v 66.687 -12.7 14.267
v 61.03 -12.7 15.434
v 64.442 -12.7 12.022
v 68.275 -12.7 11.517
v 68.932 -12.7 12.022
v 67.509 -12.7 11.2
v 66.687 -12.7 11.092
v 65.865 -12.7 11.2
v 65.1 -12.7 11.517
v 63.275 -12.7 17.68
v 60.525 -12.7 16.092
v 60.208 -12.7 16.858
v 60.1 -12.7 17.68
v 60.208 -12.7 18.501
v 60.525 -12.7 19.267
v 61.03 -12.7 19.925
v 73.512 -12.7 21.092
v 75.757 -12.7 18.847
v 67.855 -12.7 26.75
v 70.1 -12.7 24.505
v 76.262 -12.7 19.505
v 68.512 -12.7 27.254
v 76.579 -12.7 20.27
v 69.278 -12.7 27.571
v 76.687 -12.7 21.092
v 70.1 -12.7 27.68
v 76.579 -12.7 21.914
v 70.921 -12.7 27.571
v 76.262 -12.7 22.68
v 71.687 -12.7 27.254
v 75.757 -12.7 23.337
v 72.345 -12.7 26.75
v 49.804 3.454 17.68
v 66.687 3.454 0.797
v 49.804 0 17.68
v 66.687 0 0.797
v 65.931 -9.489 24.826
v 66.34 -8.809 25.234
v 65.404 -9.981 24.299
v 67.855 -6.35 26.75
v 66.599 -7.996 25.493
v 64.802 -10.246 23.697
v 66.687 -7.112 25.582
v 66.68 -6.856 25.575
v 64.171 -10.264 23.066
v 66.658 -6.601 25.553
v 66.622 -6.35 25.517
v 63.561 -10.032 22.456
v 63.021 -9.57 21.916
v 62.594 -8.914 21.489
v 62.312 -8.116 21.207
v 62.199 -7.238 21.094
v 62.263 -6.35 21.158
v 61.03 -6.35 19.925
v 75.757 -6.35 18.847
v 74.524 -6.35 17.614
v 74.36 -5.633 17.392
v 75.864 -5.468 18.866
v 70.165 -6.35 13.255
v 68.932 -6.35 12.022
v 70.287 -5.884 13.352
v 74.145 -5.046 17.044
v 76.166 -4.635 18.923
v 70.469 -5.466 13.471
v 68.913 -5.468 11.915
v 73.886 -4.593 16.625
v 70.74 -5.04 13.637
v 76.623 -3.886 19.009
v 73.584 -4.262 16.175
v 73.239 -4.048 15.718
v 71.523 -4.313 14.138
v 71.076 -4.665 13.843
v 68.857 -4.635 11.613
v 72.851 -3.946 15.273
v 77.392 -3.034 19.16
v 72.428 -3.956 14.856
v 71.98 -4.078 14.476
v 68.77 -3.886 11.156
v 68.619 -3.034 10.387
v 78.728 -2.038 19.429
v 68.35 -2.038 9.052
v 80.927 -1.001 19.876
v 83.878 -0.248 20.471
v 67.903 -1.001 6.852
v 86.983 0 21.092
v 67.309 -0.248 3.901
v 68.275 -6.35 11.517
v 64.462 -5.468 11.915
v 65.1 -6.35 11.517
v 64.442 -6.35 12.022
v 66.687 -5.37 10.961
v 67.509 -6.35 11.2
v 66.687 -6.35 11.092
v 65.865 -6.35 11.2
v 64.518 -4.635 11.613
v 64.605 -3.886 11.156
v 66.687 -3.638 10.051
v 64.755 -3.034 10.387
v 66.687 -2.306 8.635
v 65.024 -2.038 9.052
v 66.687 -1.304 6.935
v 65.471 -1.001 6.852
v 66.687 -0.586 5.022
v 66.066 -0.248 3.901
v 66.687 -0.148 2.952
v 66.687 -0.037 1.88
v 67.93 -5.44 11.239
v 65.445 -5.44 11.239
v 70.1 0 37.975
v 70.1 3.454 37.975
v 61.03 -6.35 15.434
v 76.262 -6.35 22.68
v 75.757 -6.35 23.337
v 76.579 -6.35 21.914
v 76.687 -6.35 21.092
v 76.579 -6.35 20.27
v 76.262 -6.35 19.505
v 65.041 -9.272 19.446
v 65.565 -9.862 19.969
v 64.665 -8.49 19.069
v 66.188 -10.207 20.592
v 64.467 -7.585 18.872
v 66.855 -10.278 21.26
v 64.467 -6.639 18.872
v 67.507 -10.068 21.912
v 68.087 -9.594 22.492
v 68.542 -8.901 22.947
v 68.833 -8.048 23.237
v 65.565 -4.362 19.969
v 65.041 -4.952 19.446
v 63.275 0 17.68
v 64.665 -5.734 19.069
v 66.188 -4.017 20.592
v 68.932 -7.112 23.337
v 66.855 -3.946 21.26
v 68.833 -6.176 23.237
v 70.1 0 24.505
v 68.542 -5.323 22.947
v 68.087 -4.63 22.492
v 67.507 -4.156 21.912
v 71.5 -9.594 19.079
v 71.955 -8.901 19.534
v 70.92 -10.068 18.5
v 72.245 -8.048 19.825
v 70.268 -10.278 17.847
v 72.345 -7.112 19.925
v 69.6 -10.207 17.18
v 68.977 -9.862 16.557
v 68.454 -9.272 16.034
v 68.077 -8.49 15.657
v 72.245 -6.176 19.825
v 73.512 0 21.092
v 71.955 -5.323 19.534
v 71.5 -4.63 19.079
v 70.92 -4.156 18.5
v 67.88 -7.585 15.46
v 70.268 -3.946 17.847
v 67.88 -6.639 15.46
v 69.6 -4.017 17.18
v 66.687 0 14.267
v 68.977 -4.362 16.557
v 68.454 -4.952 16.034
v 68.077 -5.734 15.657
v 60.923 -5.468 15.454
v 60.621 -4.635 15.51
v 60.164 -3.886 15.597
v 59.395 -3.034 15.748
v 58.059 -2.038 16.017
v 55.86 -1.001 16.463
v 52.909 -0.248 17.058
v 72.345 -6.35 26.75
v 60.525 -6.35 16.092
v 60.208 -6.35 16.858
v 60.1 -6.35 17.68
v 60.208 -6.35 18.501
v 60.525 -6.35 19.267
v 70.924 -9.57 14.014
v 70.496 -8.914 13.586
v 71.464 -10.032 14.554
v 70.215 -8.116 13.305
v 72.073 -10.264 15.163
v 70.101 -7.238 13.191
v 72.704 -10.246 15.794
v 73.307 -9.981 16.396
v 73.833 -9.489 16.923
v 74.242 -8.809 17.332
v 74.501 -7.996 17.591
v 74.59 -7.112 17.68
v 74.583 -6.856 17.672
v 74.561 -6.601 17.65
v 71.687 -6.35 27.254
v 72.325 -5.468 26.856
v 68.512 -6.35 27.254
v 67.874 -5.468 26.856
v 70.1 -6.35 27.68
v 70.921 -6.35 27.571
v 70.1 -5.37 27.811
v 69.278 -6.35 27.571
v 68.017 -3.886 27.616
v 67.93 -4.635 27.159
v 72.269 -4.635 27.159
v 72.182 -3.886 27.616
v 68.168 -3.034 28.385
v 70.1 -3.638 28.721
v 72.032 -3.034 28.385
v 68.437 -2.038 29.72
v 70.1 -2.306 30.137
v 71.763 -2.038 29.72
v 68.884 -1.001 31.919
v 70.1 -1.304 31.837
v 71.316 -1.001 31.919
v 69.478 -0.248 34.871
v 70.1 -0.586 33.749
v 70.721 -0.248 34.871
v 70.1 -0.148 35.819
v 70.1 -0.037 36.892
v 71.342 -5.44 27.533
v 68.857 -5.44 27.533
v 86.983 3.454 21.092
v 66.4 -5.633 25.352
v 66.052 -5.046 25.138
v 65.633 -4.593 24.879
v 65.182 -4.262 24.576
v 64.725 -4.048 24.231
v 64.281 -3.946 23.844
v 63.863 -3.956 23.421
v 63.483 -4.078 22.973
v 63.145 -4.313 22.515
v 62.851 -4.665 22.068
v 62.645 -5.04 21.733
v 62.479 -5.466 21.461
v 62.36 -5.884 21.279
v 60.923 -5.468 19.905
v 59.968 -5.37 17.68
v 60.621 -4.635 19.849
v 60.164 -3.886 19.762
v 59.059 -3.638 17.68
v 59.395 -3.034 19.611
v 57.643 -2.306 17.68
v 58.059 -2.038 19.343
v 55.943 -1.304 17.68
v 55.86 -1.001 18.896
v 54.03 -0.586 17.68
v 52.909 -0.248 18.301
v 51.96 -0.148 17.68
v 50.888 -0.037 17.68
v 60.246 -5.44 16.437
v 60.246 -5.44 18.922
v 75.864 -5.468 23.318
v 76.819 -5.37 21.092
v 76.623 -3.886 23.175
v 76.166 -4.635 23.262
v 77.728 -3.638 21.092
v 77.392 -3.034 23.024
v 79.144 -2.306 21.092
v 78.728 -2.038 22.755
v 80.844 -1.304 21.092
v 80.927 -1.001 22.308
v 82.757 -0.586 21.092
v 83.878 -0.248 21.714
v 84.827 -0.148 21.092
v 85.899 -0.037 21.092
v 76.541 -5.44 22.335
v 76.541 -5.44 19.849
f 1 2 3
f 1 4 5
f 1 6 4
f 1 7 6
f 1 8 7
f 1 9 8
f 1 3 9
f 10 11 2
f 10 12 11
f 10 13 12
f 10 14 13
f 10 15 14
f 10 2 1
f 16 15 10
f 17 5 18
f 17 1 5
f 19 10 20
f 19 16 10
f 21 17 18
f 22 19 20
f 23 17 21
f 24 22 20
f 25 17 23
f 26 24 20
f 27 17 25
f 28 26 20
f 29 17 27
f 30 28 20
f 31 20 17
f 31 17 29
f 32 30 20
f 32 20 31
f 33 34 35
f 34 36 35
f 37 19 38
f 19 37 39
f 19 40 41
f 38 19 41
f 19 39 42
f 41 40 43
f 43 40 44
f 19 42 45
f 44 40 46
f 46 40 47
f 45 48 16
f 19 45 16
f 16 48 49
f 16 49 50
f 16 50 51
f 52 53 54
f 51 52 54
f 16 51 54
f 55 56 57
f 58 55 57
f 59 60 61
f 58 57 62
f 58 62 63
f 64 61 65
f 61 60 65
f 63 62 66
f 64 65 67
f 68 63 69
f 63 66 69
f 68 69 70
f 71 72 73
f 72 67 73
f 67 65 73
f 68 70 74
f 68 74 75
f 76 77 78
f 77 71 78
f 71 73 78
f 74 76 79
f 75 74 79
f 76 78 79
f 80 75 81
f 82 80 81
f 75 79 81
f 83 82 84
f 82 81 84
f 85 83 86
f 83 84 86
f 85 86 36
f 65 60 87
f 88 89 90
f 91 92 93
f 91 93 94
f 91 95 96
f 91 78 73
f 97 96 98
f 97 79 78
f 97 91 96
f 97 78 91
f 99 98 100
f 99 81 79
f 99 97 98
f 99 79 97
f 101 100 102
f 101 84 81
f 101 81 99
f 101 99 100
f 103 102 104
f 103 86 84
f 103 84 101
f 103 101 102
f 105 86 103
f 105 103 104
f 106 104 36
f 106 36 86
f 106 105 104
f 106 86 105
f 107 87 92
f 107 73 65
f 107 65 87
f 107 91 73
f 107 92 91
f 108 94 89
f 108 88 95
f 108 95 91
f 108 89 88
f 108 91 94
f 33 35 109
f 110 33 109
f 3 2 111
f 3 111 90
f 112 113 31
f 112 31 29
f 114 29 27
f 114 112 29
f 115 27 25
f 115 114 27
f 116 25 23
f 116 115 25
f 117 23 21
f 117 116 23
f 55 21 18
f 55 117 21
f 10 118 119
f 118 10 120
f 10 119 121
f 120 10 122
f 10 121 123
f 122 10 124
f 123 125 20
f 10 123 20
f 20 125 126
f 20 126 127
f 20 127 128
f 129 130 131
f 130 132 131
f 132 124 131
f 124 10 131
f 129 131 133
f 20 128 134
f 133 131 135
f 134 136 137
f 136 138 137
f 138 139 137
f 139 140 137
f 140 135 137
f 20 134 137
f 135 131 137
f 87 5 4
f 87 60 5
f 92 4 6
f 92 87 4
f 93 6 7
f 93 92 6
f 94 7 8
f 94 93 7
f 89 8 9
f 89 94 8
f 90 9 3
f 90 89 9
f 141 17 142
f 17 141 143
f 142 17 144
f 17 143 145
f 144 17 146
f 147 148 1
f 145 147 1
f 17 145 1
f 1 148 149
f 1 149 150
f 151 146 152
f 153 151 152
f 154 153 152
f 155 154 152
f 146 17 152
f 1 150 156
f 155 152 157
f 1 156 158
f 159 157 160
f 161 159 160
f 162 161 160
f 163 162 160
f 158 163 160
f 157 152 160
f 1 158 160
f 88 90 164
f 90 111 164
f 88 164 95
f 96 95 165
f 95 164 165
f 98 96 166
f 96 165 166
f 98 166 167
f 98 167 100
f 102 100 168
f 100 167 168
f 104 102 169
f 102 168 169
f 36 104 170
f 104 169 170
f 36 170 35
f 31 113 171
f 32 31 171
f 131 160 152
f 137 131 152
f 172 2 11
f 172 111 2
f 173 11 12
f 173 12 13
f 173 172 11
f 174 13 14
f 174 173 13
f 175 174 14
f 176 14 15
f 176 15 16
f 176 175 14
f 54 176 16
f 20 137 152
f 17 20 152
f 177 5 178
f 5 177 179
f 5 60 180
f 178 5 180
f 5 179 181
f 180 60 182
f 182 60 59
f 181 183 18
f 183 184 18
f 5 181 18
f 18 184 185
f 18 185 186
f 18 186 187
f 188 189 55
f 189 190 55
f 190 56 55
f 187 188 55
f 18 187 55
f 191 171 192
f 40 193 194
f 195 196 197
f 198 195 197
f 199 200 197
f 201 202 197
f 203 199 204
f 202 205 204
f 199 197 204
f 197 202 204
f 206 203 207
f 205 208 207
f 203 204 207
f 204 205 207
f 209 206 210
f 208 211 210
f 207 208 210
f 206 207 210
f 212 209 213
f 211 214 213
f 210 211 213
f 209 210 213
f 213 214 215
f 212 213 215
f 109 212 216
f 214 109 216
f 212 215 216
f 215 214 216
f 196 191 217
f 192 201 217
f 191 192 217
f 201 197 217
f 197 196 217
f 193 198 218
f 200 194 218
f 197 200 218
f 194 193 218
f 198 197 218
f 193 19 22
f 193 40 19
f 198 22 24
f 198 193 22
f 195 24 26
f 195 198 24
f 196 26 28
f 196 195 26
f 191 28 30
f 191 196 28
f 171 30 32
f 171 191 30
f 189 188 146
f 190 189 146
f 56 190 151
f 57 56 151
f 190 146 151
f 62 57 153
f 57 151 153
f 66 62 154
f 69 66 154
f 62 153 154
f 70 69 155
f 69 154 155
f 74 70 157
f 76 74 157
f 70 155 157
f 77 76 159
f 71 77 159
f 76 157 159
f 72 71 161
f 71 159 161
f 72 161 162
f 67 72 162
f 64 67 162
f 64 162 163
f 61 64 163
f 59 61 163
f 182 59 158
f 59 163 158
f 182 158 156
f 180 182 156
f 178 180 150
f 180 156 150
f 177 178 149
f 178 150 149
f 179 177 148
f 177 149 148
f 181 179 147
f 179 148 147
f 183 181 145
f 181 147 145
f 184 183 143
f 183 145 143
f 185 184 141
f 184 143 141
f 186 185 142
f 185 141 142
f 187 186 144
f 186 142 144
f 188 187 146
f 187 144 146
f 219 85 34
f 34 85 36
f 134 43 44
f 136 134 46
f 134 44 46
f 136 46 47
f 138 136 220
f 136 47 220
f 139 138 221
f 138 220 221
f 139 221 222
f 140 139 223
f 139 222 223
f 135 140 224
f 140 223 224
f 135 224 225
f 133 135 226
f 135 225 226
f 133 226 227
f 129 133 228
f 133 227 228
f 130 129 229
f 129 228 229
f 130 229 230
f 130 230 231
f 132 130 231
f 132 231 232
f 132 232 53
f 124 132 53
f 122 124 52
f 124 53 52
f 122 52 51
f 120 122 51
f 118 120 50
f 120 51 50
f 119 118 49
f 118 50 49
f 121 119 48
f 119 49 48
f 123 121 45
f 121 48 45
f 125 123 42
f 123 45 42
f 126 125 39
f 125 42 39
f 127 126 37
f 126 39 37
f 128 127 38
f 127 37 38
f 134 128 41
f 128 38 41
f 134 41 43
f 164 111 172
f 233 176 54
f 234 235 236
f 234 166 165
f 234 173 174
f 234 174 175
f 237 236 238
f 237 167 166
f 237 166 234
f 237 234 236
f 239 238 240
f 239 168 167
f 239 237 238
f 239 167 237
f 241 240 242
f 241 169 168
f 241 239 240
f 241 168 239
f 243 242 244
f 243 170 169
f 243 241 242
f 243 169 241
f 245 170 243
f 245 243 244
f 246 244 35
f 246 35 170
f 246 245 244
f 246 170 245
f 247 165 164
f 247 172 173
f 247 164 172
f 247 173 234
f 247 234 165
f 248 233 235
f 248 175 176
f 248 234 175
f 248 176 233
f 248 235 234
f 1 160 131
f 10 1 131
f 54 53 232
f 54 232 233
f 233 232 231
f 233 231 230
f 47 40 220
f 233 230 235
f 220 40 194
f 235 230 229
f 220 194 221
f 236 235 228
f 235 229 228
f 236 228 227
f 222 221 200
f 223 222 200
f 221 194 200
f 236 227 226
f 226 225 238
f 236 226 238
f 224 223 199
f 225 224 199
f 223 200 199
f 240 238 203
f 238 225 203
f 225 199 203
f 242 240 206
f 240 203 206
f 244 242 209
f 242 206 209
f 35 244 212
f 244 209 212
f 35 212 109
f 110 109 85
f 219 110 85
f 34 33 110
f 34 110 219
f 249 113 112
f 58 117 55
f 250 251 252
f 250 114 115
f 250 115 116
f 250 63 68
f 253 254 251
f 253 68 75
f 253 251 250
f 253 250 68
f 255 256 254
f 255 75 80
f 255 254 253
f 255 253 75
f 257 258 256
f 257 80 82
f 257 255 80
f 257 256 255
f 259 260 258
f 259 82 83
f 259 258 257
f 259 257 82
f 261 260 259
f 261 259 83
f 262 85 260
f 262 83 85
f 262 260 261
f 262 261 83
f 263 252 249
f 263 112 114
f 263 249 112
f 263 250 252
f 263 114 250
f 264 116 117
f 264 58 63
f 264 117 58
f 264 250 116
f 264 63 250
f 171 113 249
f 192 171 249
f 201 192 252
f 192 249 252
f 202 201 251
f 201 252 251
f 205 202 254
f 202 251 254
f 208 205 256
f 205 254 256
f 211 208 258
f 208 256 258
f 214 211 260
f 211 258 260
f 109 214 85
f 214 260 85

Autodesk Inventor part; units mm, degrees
ref_plane "YZ Plane" through (0, 0, 0) normal (1, 0, 0) x (0, 1, 0)
ref_plane "XZ Plane" through (0, 0, 0) normal (0, 1, 0) x (-1, 0, 0)
ref_plane "XY Plane" through (0, 0, 0) normal (0, 0, 1) x (1, 0, 0)
sketch "Sketch1" plane through (0, 0, 0) normal (1, 0, 0) x (0, 1, 0)
  line L0 (0, 0) -> (41.5544, 0)
  line L1 (41.5544, 0) -> (41.5544, 37.0078)
  line L2 (41.5544, 37.0078) -> (0, 37.0078)
  line L3 (0, 37.0078) -> (0, 0)
  circle A0 centre (20.7772, 18.5039) radius 12.8778
  dimension "d0" = 41.5544
  dimension "d1" = 37.0078
  dimension "d2" = 25.7556
sketch "Sketch1 outline for Extrusion1" plane through (0, 0, 0) normal (1, 0, 0) x (0, 1, 0)
  line L0 (0, 0) -> (41.5544, 0)
  line L1 (0, 37.0078) -> (0, 0)
  line L2 (41.5544, 0) -> (41.5544, 37.0078)
  line L3 (41.5544, 37.0078) -> (0, 37.0078)
  circle A0 centre (20.7772, 18.5039) radius 12.8778
extrude "Extrusion1" add sketch "Sketch1 outline for Extrusion1" along normal blind 50.8
sketch "Sketch2" plane through (0, 0, 0) normal (0, 0, -1) x (-1, 0, 0)
  line L0 (-50.8, 0) -> (-50.8, 41.5544) projected
  line L1 (-50.8, 41.5544) -> (-87.8078, 41.5544)
  line L2 (-87.8078, 41.5544) -> (-87.8078, 0)
  line L3 (-87.8078, 0) -> (-50.8, 0)
  line L4 (-50.8, 0) -> (-50.8, 41.5544)
  circle A0 centre (-69.3039, 20.7772) radius 12.8778
  dimension "d5" = 37.0078
  dimension "d6" = 25.7556
sketch "Sketch2 outline for Extrusion2" plane through (0, 0, 0) normal (0, 0, -1) x (-1, 0, 0)
  line L0 (-50.8, 41.5544) -> (-87.8078, 41.5544)
  line L1 (-50.8, 0) -> (-50.8, 41.5544)
  line L2 (-87.8078, 0) -> (-50.8, 0)
  line L3 (-87.8078, 41.5544) -> (-87.8078, 0)
extrude "Extrusion2" add sketch "Sketch2 outline for Extrusion2" against normal up to surface (37.0078 mm away)
sketch "Sketch3" plane through (0, 0, 0) normal (0, 0, -1) x (-1, 0, 0)
  line L0 (0, 41.5544) -> (-87.8078, 41.5544) projected
  line L1 (-87.8078, 41.5544) -> (-87.8078, 0) projected
  line L2 (0, 0) -> (-87.8078, 0) projected
  line L3 (0, 0) -> (-87.8078, 0) projected
  line L4 (-87.8078, 41.5544) -> (-50.8, 41.5544)
  line L5 (-50.8, 41.5544) -> (-50.8, 0)
  line L6 (-50.8, 0) -> (-87.8078, 0)
  line L7 (-87.8078, 0) -> (-87.8078, 41.5544)
  circle A0 centre (-69.3039, 20.7772) radius 12.8778
  point P0 (-50.8, 0)
  dimension "d9" = 37.0078
  dimension "d10" = 25.7556
sketch "Sketch3 outline for Extrusion3" plane through (0, 0, 0) normal (0, 0, -1) x (-1, 0, 0)
  line L0 (-50.8, 0) -> (-50.8, 41.5544)
  line L1 (-87.8078, 0) -> (-50.8, 0)
  line L2 (-50.8, 41.5544) -> (-87.8078, 41.5544)
  line L3 (-87.8078, 41.5544) -> (-87.8078, 0)
  circle A0 centre (-69.3039, 20.7772) radius 12.8778
extrude "Extrusion3" add sketch "Sketch3 outline for Extrusion3" along normal blind 50.8
sketch "Sketch4" plane through (0, 41.5544, 37.0078) normal (0, 1, 0) x (1, 0, 0)
  line L0 (0, 0) -> (87.8078, 0)
  line L1 (87.8078, 87.8078) -> (87.8078, 0)
  line L2 (50.8, 37.0078) -> (50.8, 87.8078)
  line L3 (87.8078, 0) -> (87.8078, 87.8078)
  line L4 (50.8, 37.0078) -> (87.8078, 0)
  line L5 (87.8078, 0) -> (123.159418, -36.481545)
  line L6 (87.8078, 0) -> (100.892033, 13.084233)
  line L7 (0, 0) -> (87.8078, 0)
  line L8 (87.8078, 0) -> (74.723567, -13.084233)
  line L9 (100.892033, 13.084233) -> (87.8078, 26.168466)
  line L10 (74.723567, -13.084233) -> (61.639334, 0)
  line L11 (100.892033, 13.084233) -> (136.808615, -22.832348)
  line L12 (136.808615, -22.832348) -> (123.159418, -36.481545)
  line L13 (123.159418, -36.481545) -> (110.640148, -49.000815)
  line L14 (123.159418, -36.481545) -> (140.864338, -36.481545) construction
  line L15 (110.640148, -49.000815) -> (74.723567, -13.084233)
  dimension "d13" = 50.8
  dimension "d14" = 18.5039
  dimension "d15" = 18.5039
  dimension "d16" = 135
sketch "Sketch4 outline for Extrusion4" plane through (0, 41.5544, 37.0078) normal (0, 1, 0) x (1, 0, 0)
  line L0 (87.8078, 0) -> (61.639334, 0)
  line L1 (87.8078, 26.168466) -> (87.8078, 0)
  line L2 (100.892033, 13.084233) -> (87.8078, 26.168466)
  line L3 (136.808615, -22.832348) -> (100.892033, 13.084233)
  line L4 (123.159418, -36.481545) -> (136.808615, -22.832348)
  line L5 (110.640148, -49.000815) -> (123.159418, -36.481545)
  line L6 (74.723567, -13.084233) -> (110.640148, -49.000815)
  line L7 (61.639334, 0) -> (74.723567, -13.084233)
extrude "Extrusion4" add sketch "Sketch4 outline for Extrusion4" against normal up to surface (41.5544 mm away)
sketch "Sketch5" plane through (136.808615, 0, 59.840148) normal (0.7071068, 0, 0.7071068) x (0.7071068, 0, -0.7071068)
  line L0 (-18.5039, 41.5544) -> (-18.5039, 0) projected
  circle A0 centre (-18.5039, 20.7772) radius 12.8778
  point P0 (-54.424924, 0)
  dimension "d19" = 25.7556
sketch "Sketch5 outline for Extrusion5" plane through (136.808615, 0, 59.840148) normal (0.7071068, 0, 0.7071068) x (0.7071068, 0, -0.7071068)
  circle A0 centre (-18.5039, 20.7772) radius 12.8778
extrude "Extrusion5" cut sketch "Sketch5 outline for Extrusion5" against normal blind 76.2
sketch "Sketch6" plane through (0, 41.5544, 37.0078) normal (0, 1, 0) x (1, 0, 0)
  line L0 (0, 37.0078) -> (0, 0)
  line L1 (0, 0) -> (61.639334, 0)
  line L2 (61.639334, 0) -> (110.640148, -49.000815)
  line L3 (110.640148, -49.000815) -> (136.808615, -22.832348)
  line L4 (136.808615, -22.832348) -> (87.8078, 26.168466)
  line L5 (87.8078, 87.8078) -> (87.8078, 26.168466)
  line L6 (50.8, 87.8078) -> (87.8078, 87.8078)
  line L7 (50.8, 37.0078) -> (50.8, 87.8078)
  line L8 (0, 37.0078) -> (50.8, 37.0078)
  line L9 (0, 18.5039) -> (69.3039, 18.5039)
  line L10 (69.3039, 18.5039) -> (69.3039, 87.8078)
  line L11 (56.4261, 87.8078) -> (82.1817, 87.8078)
  line L12 (69.3039, 18.5039) -> (123.724381, -35.916581)
  circle A0 centre (2.4892, 2.879001) radius 1.5875
  circle A1 centre (2.4892, 34.128799) radius 1.5875
  circle A2 centre (84.928799, 85.3186) radius 1.5875
  circle A3 centre (53.679001, 85.3186) radius 1.5875
  circle A4 centre (110.915779, -45.204923) radius 1.5875
  circle A5 centre (133.012723, -23.107979) radius 1.5875
  dimension "d22" = 3.175
  dimension "d23" = 3.175
  dimension "d24" = 2.4892
  dimension "d25" = 2.4892
  dimension "d26" = 2.879
  dimension "d27" = 2.879
  dimension "d28" = 3.175
  dimension "d29" = 3.175
  dimension "d30" = 2.4892
  dimension "d31" = 2.4892
  dimension "d32" = 2.879
  dimension "d33" = 2.879
  dimension "d34" = 3.175
  dimension "d35" = 3.175
  dimension "d36" = 2.4892
  dimension "d37" = 2.4892
  dimension "d38" = 2.879
  dimension "d39" = 2.879
sketch "Sketch6 outline for Extrusion6" plane through (0, 41.5544, 37.0078) normal (0, 1, 0) x (1, 0, 0)
  circle A0 centre (110.915779, -45.204923) radius 1.5875
  circle A1 centre (133.012723, -23.107979) radius 1.5875
  circle A2 centre (2.4892, 34.128799) radius 1.5875
  circle A3 centre (2.4892, 2.879001) radius 1.5875
  circle A4 centre (53.679001, 85.3186) radius 1.5875
  circle A5 centre (84.928799, 85.3186) radius 1.5875
extrude "Extrusion6" cut sketch "Sketch6 outline for Extrusion6" against normal blind 50.8
sketch "Sketch7" plane through (0, 41.5544, 37.0078) normal (0, 1, 0) x (1, 0, 0)
  circle A0 centre (2.4892, 2.879001) radius 1.5875
  circle A1 centre (110.915779, -45.204923) radius 1.5875
  circle A2 centre (53.679001, 85.3186) radius 1.5875
  circle A3 centre (2.4892, 34.128799) radius 1.5875
  circle A4 centre (84.928799, 85.3186) radius 1.5875
  line L0 (0, 37.0078) -> (0, 0)
  line L1 (0, 0) -> (61.639334, 0)
  line L2 (61.639334, 0) -> (110.640148, -49.000815)
  line L3 (110.640148, -49.000815) -> (136.808615, -22.832348)
  line L4 (136.808615, -22.832348) -> (87.8078, 26.168466)
  line L5 (87.8078, 87.8078) -> (87.8078, 26.168466)
  line L6 (50.8, 87.8078) -> (87.8078, 87.8078)
  line L7 (50.8, 37.0078) -> (50.8, 87.8078)
  line L8 (0, 37.0078) -> (50.8, 37.0078)
  circle A5 centre (133.012723, -23.107979) radius 1.5875
  circle A6 centre (133.012723, -23.107979) radius 6
  circle A7 centre (110.915779, -45.204923) radius 6
  circle A8 centre (2.4892, 2.879001) radius 6
  circle A9 centre (2.4892, 34.128799) radius 6
  circle A10 centre (53.679001, 85.3186) radius 6
  circle A11 centre (84.928799, 85.3186) radius 6
  point P0 (0, 8.338294)
  point P1 (7.753357, 0)
  point P2 (7.753357, 37.0078)
  point P3 (0, 28.669506)
  point P4 (59.138294, 87.8078)
  point P5 (50.8, 80.054443)
  point P6 (79.469506, 87.8078)
  point P7 (87.8078, 80.054443)
  point P8 (130.91255, -28.728413)
  point P9 (131.326163, -17.349897)
  point P10 (105.157697, -43.518363)
  point P11 (116.536213, -43.10475)
  dimension "d42" = 12
  dimension "d43" = 12
  dimension "d44" = 12
  dimension "d45" = 12
  dimension "d46" = 12
  dimension "d47" = 12
sketch "Sketch7 outline for Extrusion7" plane through (0, 41.5544, 37.0078) normal (0, 1, 0) x (1, 0, 0)
  arc A0 (0, 8.338294) -> (7.753357, 0) centre (2.4892, 2.879001) ccw
  line L0 (0, 0) -> (0, 8.338294)
  line L1 (7.753357, 0) -> (0, 0)
  arc A1 (7.753357, 37.0078) -> (0, 28.669506) centre (2.4892, 34.128799) ccw
  line L2 (0, 37.0078) -> (7.753357, 37.0078)
  line L3 (0, 28.669506) -> (0, 37.0078)
  arc A2 (59.138294, 87.8078) -> (50.8, 80.054443) centre (53.679001, 85.3186) ccw
  line L4 (50.8, 87.8078) -> (59.138294, 87.8078)
  line L5 (50.8, 80.054443) -> (50.8, 87.8078)
  arc A3 (87.8078, 80.054443) -> (79.469506, 87.8078) centre (84.928799, 85.3186) ccw
  line L6 (87.8078, 87.8078) -> (87.8078, 80.054443)
  line L7 (79.469506, 87.8078) -> (87.8078, 87.8078)
  arc A4 (130.91255, -28.728413) -> (131.326163, -17.349897) centre (133.012723, -23.107979) ccw
  line L8 (136.808615, -22.832348) -> (130.91255, -28.728413)
  line L9 (131.326163, -17.349897) -> (136.808615, -22.832348)
  arc A5 (105.157697, -43.518363) -> (116.536213, -43.10475) centre (110.915779, -45.204923) ccw
  line L10 (110.640148, -49.000815) -> (105.157697, -43.518363)
  line L11 (116.536213, -43.10475) -> (110.640148, -49.000815)
extrude "Extrusion7" add sketch "Sketch7 outline for Extrusion7" against normal blind 4.7752
sketch "Sketch8" plane through (0, 0, 0) normal (0, -1, 0) x (1, 0, 0)
  circle A0 centre (2.4892, 34.128799) radius 1.5875
  circle A1 centre (53.679001, -48.3108) radius 1.5875
  circle A2 centre (2.4892, 2.879001) radius 1.5875
  circle A3 centre (84.928799, -48.3108) radius 1.5875
  line L0 (0, 37.0078) -> (0, 0)
  line L1 (0, 0) -> (50.8, 0)
  line L2 (50.8, 0) -> (50.8, -50.8)
  line L3 (87.8078, -50.8) -> (50.8, -50.8)
  line L4 (87.8078, 10.839334) -> (87.8078, -50.8)
  line L5 (136.808615, 59.840148) -> (87.8078, 10.839334)
  line L6 (110.640148, 86.008615) -> (136.808615, 59.840148)
  line L7 (61.639334, 37.0078) -> (110.640148, 86.008615)
  line L8 (0, 37.0078) -> (61.639334, 37.0078)
  circle A4 centre (110.915779, 82.212723) radius 1.5875
  circle A5 centre (110.915779, 82.212723) radius 6
  circle A6 centre (133.012723, 60.115779) radius 1.5875
  circle A7 centre (133.012723, 60.115779) radius 6
  circle A8 centre (84.928799, -48.3108) radius 6
  circle A9 centre (53.679001, -48.3108) radius 6
  circle A10 centre (2.4892, 2.879001) radius 6
  circle A11 centre (2.4892, 34.128799) radius 6
  point P0 (0, 8.338294)
  point P1 (7.753357, 0)
  point P2 (7.753357, 37.0078)
  point P3 (0, 28.669506)
  point P4 (116.536213, 80.11255)
  point P5 (105.157697, 80.526163)
  point P6 (131.326163, 54.357697)
  point P7 (130.91255, 65.736213)
  point P8 (87.8078, -43.046643)
  point P9 (79.469506, -50.8)
  point P10 (50.8, -43.046643)
  point P11 (59.138294, -50.8)
  dimension "d50" = 12
sketch "Sketch8 outline for Extrusion8" plane through (0, 0, 0) normal (0, -1, 0) x (1, 0, 0)
  arc A0 (0, 8.338294) -> (7.753357, 0) centre (2.4892, 2.879001) ccw
  line L0 (0, 0) -> (0, 8.338294)
  line L1 (7.753357, 0) -> (0, 0)
  arc A1 (7.753357, 37.0078) -> (0, 28.669506) centre (2.4892, 34.128799) ccw
  line L2 (0, 37.0078) -> (7.753357, 37.0078)
  line L3 (0, 28.669506) -> (0, 37.0078)
  arc A2 (116.536213, 80.11255) -> (105.157697, 80.526163) centre (110.915779, 82.212723) ccw
  line L4 (110.640148, 86.008615) -> (116.536213, 80.11255)
  line L5 (105.157697, 80.526163) -> (110.640148, 86.008615)
  arc A3 (131.326163, 54.357697) -> (130.91255, 65.736213) centre (133.012723, 60.115779) ccw
  line L6 (136.808615, 59.840148) -> (131.326163, 54.357697)
  line L7 (130.91255, 65.736213) -> (136.808615, 59.840148)
  arc A4 (79.469506, -50.8) -> (87.8078, -43.046643) centre (84.928799, -48.3108) ccw
  line L8 (87.8078, -50.8) -> (79.469506, -50.8)
  line L9 (87.8078, -43.046643) -> (87.8078, -50.8)
  arc A5 (50.8, -43.046643) -> (59.138294, -50.8) centre (53.679001, -48.3108) ccw
  line L10 (50.8, -50.8) -> (50.8, -43.046643)
  line L11 (59.138294, -50.8) -> (50.8, -50.8)
extrude "Extrusion8" add sketch "Sketch8 outline for Extrusion8" against normal blind 4.7752
sketch "Sketch9" plane through (0, 41.5544, 28.669506) normal (0, 1, 0) x (1, 0, 0)
  circle A0 centre (2.4892, -5.459293) radius 1.5875
  circle A1 centre (110.915779, -53.543218) radius 1.5875
  circle A2 centre (53.679001, 76.980306) radius 1.5875
  circle A3 centre (2.4892, 25.790504) radius 1.5875
  circle A4 centre (133.012723, -31.446274) radius 1.5875
  circle A5 centre (84.928799, 76.980306) radius 1.5875
  arc A6 (0, 0) -> (7.753357, -8.338294) centre (2.4892, -5.459293) ccw
  arc A7 (105.157697, -51.856657) -> (116.536213, -51.443044) centre (110.915779, -53.543218) ccw
  arc A8 (87.8078, 71.716148) -> (79.469506, 79.469506) centre (84.928799, 76.980306) ccw
  arc A9 (7.753357, 28.669506) -> (0, 20.331211) centre (2.4892, 25.790504) ccw
  circle A10 centre (110.915779, -53.543218) radius 2.925
  circle A11 centre (133.012723, -31.446274) radius 1.5875
  circle A12 centre (133.012723, -31.446274) radius 2.925
  circle A13 centre (84.928799, 76.980306) radius 2.925
  circle A14 centre (53.679001, 76.980306) radius 1.5875
  circle A15 centre (53.679001, 76.980306) radius 2.925
  circle A16 centre (2.4892, 25.790504) radius 2.925
  circle A17 centre (2.4892, -5.459293) radius 2.925
  point P0 (0, 28.669506)
  dimension "d53" = 5.85
  dimension "d54" = 5.85
  dimension "d55" = 5.85
  dimension "d56" = 5.85
  dimension "d57" = 5.85
  dimension "d58" = 5.85
sketch "Sketch10" plane through (0, 0, -50.8) normal (0, 0, -1) x (-1, 0, 0)
  line L0 (-59.138294, 4.7752) -> (-50.8, 4.7752)
  line L1 (-50.8, 4.7752) -> (-50.8, 36.7792)
  line L2 (-50.8, 36.7792) -> (-59.138294, 36.7792)
  line L3 (-79.469506, 36.7792) -> (-87.8078, 36.7792)
  line L4 (-87.8078, 36.7792) -> (-87.8078, 4.7752)
  line L5 (-87.8078, 4.7752) -> (-79.469506, 4.7752)
  circle A0 centre (-69.3039, 20.7772) radius 12.8778
  line L6 (-87.8078, 4.7752) -> (-50.8, 4.7752)
  line L7 (-50.8, 4.7752) -> (-50.8, 36.7792)
  line L8 (-50.8, 36.7792) -> (-87.8078, 36.7792)
  line L9 (-87.8078, 36.7792) -> (-87.8078, 4.7752)
  line L10 (-87.8078, 4.7752) -> (-50.8, 36.7792) construction
  line L11 (-50.8, 4.7752) -> (-87.8078, 36.7792) construction
  point P0 (0, 0)
sketch "Sketch10 outline for Extrusion9" plane through (0, 0, -50.8) normal (0, 0, -1) x (-1, 0, 0)
  line L0 (-59.138294, 36.7792) -> (-79.469506, 36.7792)
  line L1 (-50.8, 36.7792) -> (-59.138294, 36.7792)
  line L2 (-79.469506, 36.7792) -> (-87.8078, 36.7792)
  line L3 (-50.8, 4.7752) -> (-50.8, 36.7792)
  line L4 (-87.8078, 36.7792) -> (-87.8078, 4.7752)
  line L5 (-59.138294, 4.7752) -> (-50.8, 4.7752)
  line L6 (-87.8078, 4.7752) -> (-79.469506, 4.7752)
  line L7 (-79.469506, 4.7752) -> (-59.138294, 4.7752)
  circle A0 centre (-69.3039, 20.7772) radius 12.8778
extrude "Extrusion9" cut sketch "Sketch10 outline for Extrusion9" against normal blind 5.0038
sketch "Sketch11" plane through (0, 0, 0) normal (-1, 0, 0) x (0, 0, 1)
  line L0 (28.669506, 4.7752) -> (37.0078, 4.7752)
  line L1 (37.0078, 36.7792) -> (37.0078, 4.7752)
  line L2 (37.0078, 36.7792) -> (28.669506, 36.7792)
  line L3 (8.338294, 36.7792) -> (0, 36.7792)
  line L4 (0, 4.7752) -> (0, 36.7792)
  line L5 (0, 4.7752) -> (8.338294, 4.7752)
  circle A0 centre (18.5039, 20.7772) radius 12.8778
  line L6 (0, 4.7752) -> (37.0078, 4.7752)
  line L7 (37.0078, 4.7752) -> (37.0078, 36.7792)
  line L8 (37.0078, 36.7792) -> (0, 36.7792)
  line L9 (0, 36.7792) -> (0, 4.7752)
  line L10 (0, 4.7752) -> (37.0078, 36.7792) construction
  line L11 (37.0078, 4.7752) -> (0, 36.7792) construction
  point P0 (0, 0)
sketch "Sketch11 outline for Extrusion10" plane through (0, 0, 0) normal (-1, 0, 0) x (0, 0, 1)
  line L0 (28.669506, 36.7792) -> (8.338294, 36.7792)
  line L1 (37.0078, 36.7792) -> (28.669506, 36.7792)
  line L2 (8.338294, 36.7792) -> (0, 36.7792)
  line L3 (37.0078, 4.7752) -> (37.0078, 36.7792)
  line L4 (0, 36.7792) -> (0, 4.7752)
  line L5 (28.669506, 4.7752) -> (37.0078, 4.7752)
  line L6 (0, 4.7752) -> (8.338294, 4.7752)
  line L7 (8.338294, 4.7752) -> (28.669506, 4.7752)
  circle A0 centre (18.5039, 20.7772) radius 12.8778
extrude "Extrusion10" cut sketch "Sketch11 outline for Extrusion10" against normal blind 5.0038
sketch "Sketch12" plane through (130.91255, 36.7792, 65.736213) normal (0.7071068, 0, 0.7071068) x (0.7071068, 0, -0.7071068)
  line L0 (0, -32.004) -> (8.338294, -32.004)
  line L1 (8.338294, 0) -> (8.338294, -32.004)
  line L2 (8.338294, 0) -> (0, 0)
  line L3 (-20.331211, 0) -> (-28.669506, 0)
  line L4 (-28.669506, 0) -> (-28.669506, -32.004)
  line L5 (-28.669506, -32.004) -> (-20.331211, -32.004)
  circle A0 centre (-10.165606, -16.002) radius 12.8778
  line L6 (-28.669506, -32.004) -> (8.338294, -32.004)
  line L7 (8.338294, -32.004) -> (8.338294, 0)
  line L8 (8.338294, 0) -> (-28.669506, 0)
  line L9 (-28.669506, 0) -> (-28.669506, -32.004)
  line L10 (-28.669506, -32.004) -> (8.338294, 0) construction
  line L11 (8.338294, -32.004) -> (-28.669506, 0) construction
  point P0 (-46.08663, -36.7792)
  point P1 (-20.331211, 0)
  point P2 (-20.331211, -32.004)
sketch "Sketch12 outline for Extrusion11" plane through (130.91255, 36.7792, 65.736213) normal (0.7071068, 0, 0.7071068) x (0.7071068, 0, -0.7071068)
  line L0 (0, 0) -> (-20.331211, 0)
  line L1 (8.338294, 0) -> (0, 0)
  line L2 (-20.331211, 0) -> (-28.669506, 0)
  line L3 (8.338294, -32.004) -> (8.338294, 0)
  line L4 (-28.669506, 0) -> (-28.669506, -32.004)
  line L5 (0, -32.004) -> (8.338294, -32.004)
  line L6 (-28.669506, -32.004) -> (-20.331211, -32.004)
  line L7 (-20.331211, -32.004) -> (0, -32.004)
  circle A0 centre (-10.165606, -16.002) radius 12.8778
extrude "Extrusion11" cut sketch "Sketch12 outline for Extrusion11" against normal blind 5.0038
sketch "Sketch9 outline for Extrusion12" plane through (0, 41.5544, 28.669506) normal (0, 1, 0) x (1, 0, 0)
  circle A0 centre (53.679001, 76.980306) radius 2.925
  circle A1 centre (53.679001, 76.980306) radius 1.5875
  circle A2 centre (84.928799, 76.980306) radius 2.925
  circle A3 centre (84.928799, 76.980306) radius 1.5875
  circle A4 centre (133.012723, -31.446274) radius 2.925
  circle A5 centre (133.012723, -31.446274) radius 1.5875
  circle A6 centre (110.915779, -53.543218) radius 2.925
  circle A7 centre (110.915779, -53.543218) radius 1.5875
  circle A8 centre (2.4892, -5.459293) radius 2.925
  circle A9 centre (2.4892, -5.459293) radius 1.5875
  circle A10 centre (2.4892, 25.790504) radius 2.925
  circle A11 centre (2.4892, 25.790504) radius 1.5875
extrude "Extrusion12" cut sketch "Sketch9 outline for Extrusion12" against normal blind 5.08
sketch "Sketch13" plane through (0, 41.5544, 28.669506) normal (0, 1, 0) x (1, 0, 0)
  line L0 (59.138294, 79.469506) -> (79.469506, 79.469506)
  line L1 (0, 20.331211) -> (0, 0)
  line L2 (116.536213, -51.443044) -> (130.91255, -37.066707)
  line L3 (78.948824, 18.732641) -> (60.736865, 0.520681)
  line L4 (79.469506, 79.469506) -> (59.138294, 79.469506)
  line L5 (69.3039, 79.469506) -> (69.3039, 9.087716)
  line L6 (69.3039, 9.087716) -> (123.185437, -44.79382)
  line L7 (130.91255, -37.066707) -> (116.536213, -51.443044)
  line L8 (0, 10.165606) -> (69.3039, 10.165606)
  circle A0 centre (15.875, 10.165606) radius 6.35
  circle A1 centre (69.3039, 63.594506) radius 6.35
  circle A2 centre (111.960117, -33.5685) radius 6.35
  circle A3 centre (41.275, 10.165606) radius 6.35
  circle A4 centre (69.3039, 38.194506) radius 6.35
  circle A5 centre (93.999604, -15.607988) radius 6.35
  circle A6 centre (76.039092, 2.352524) radius 6.35
  point P0 (0, 28.669506)
  dimension "d68" = 12.7
  dimension "d69" = 15.875
  dimension "d72" = 12.7
  dimension "d73" = 15.875
  dimension "d77" = 12.7
  dimension "d78" = 15.875
  dimension "d83" = 25.4
  dimension "d90" = 25.4
  dimension "d97" = 25.4
extrude "Extrusion13" [suppressed]
sketch "Sketch15" plane through (0, 0, 8.338294) normal (0, -1, 0) x (1, 0, 0)
  line L0 (0, 0) -> (0, 20.331211)
  line L1 (116.754985, -37.31401) -> (68.393487, 11.047489)
  line L2 (68.393487, 11.047489) -> (118.02233, 60.676332)
  line L3 (68.393487, 11.047489) -> (18.764644, 60.676332) construction
  line L4 (73.512233, 12.753737) -> (70.099736, 16.166235)
  line L5 (70.099736, 16.166235) -> (63.274741, 9.34124)
  line L6 (63.274741, 9.34124) -> (66.687238, 5.928743)
  line L7 (66.687238, 5.928743) -> (73.512233, 12.753737)
  line L8 (73.512233, 12.753737) -> (63.274741, 9.34124) construction
  line L9 (70.099736, 16.166235) -> (66.687238, 5.928743) construction
  line L10 (78.002361, 12.753737) -> (70.099736, 20.656363)
  line L11 (70.099736, 20.656363) -> (58.784613, 9.34124)
  line L12 (58.784613, 9.34124) -> (66.687238, 1.438615)
  line L13 (66.687238, 1.438615) -> (78.002361, 12.753737)
  line L14 (78.002361, 12.753737) -> (58.784613, 9.34124) construction
  line L15 (70.099736, 20.656363) -> (66.687238, 1.438615) construction
  point P0 (0, -8.338294)
  dimension "d104" = 90
  dimension "d105" = 4.826
  dimension "d106" = 9.652
  dimension "d107" = 11.176
  dimension "d108" = 16.002
sketch "Sketch15 outline for Extrusion14" plane through (0, 0, 8.338294) normal (0, -1, 0) x (1, 0, 0)
  line L0 (66.687238, 1.438615) -> (78.002361, 12.753737)
  line L1 (58.784613, 9.34124) -> (66.687238, 1.438615)
  line L2 (78.002361, 12.753737) -> (70.099736, 20.656363)
  line L3 (70.099736, 20.656363) -> (58.784613, 9.34124)
  line L4 (73.512233, 12.753737) -> (66.687238, 5.928743)
  line L5 (70.099736, 16.166235) -> (73.512233, 12.753737)
  line L6 (63.274741, 9.34124) -> (70.099736, 16.166235)
  line L7 (66.687238, 5.928743) -> (63.274741, 9.34124)
extrude "Extrusion14" add sketch "Sketch15 outline for Extrusion14" along normal blind 12.7
sketch "Sketch16" plane through (58.784613, 0, 17.679534) normal (-0.7071068, 0, 0.7071068) x (0.7071068, 0, 0.7071068)
  line L0 (0, 0) -> (0, -12.7) projected
  line L1 (16.002, -12.7) -> (0, -12.7) projected
  circle A0 centre (8.001, -7.112) radius 3.175
  point P0 (-54.068317, 0)
  dimension "d111" = 6.35
  dimension "d112" = 8.001
  dimension "d113" = 5.588
sketch "Sketch16 outline for Extrusion15" plane through (58.784613, 0, 17.679534) normal (-0.7071068, 0, 0.7071068) x (0.7071068, 0, 0.7071068)
  circle A0 centre (8.001, -7.112) radius 3.175
extrude "Extrusion15" cut sketch "Sketch16 outline for Extrusion15" against normal blind 279.4
sketch "Sketch18" plane through (0, 41.5544, 28.669506) normal (0, 1, 0) x (1, 0, 0)
  circle A0 centre (55.931223, 23.87791) radius 2.032
  circle A1 centre (49.619112, 3.536194) radius 2.032
  circle A2 centre (69.401607, 37.348294) radius 2.032
  circle A3 centre (42.744848, 10.129382) radius 2.032
  circle A4 centre (76.275871, 30.755107) radius 2.032
  point P0 (0, 28.669506)
sketch "Sketch18 outline for Extrusion18" plane through (0, 41.5544, 28.669506) normal (0, 1, 0) x (1, 0, 0)
  circle A0 centre (49.619112, 3.536194) radius 2.032
  circle A1 centre (42.744848, 10.129382) radius 2.032
  circle A2 centre (55.931223, 23.87791) radius 2.032
  circle A3 centre (69.401607, 37.348294) radius 2.032
  circle A4 centre (76.275871, 30.755107) radius 2.032
extrude "Extrusion18" cut sketch "Sketch18 outline for Extrusion18" against normal blind 279.4
fillet "Fillet2" radius 6.35 4 edges at (62.7359, 0, 13.7282) (72.3448, 0, 15.4345) (74.051, 0, 25.0433) (64.4422, 0, 23.3371)
fillet "Fillet3" radius 3.175 14 edges at (66.6872, -1.8599, 7.1467) (66.6872, -9.525, 9.7769) (59.952, 0, 27.8272) (58.2458, 0, 9.2381) (76.8349, 0, 10.9443) (56.1544, -1.8599, 17.6795) (74.051, -6.35, 25.0433) (80.6326, -1.8599, 21.092) (76.2633, -6.35, 19.353) (78.0024, -9.525, 21.092) (68.3607, -6.35, 27.2556) (70.0997, -1.8599, 31.6249) (70.0997, -9.525, 28.9947) (58.7846, -9.525, 17.6795)
sketch "Sketch19" plane through (0, 0, 8.338294) normal (0, -1, 0) x (1, 0, 0)
  circle A0 centre (2.4892, 25.790504) radius 1.5875
  circle A1 centre (110.915779, 73.874429) radius 1.5875
  circle A2 centre (53.679001, -56.649094) radius 1.5875
  circle A3 centre (2.4892, -5.459293) radius 1.5875
  circle A4 centre (133.012723, 51.777485) radius 1.5875
  circle A5 centre (84.928799, -56.649094) radius 1.5875
  line L0 (0, 20.331211) -> (0, 0)
  arc A6 (0, 0) -> (7.753357, -8.338294) centre (2.4892, -5.459293) ccw
  line L1 (7.753357, -8.338294) -> (50.8, -8.338294)
  line L2 (50.8, -8.338294) -> (50.8, -51.384937)
  arc A7 (50.8, -51.384937) -> (59.138294, -59.138294) centre (53.679001, -56.649094) ccw
  line L3 (79.469506, -59.138294) -> (59.138294, -59.138294)
  arc A8 (79.469506, -59.138294) -> (87.8078, -51.384937) centre (84.928799, -56.649094) ccw
  line L4 (87.8078, 2.501039) -> (87.8078, -51.384937)
  line L5 (131.326163, 46.019402) -> (87.8078, 2.501039)
  arc A9 (131.326163, 46.019402) -> (130.91255, 57.397918) centre (133.012723, 51.777485) ccw
  line L6 (116.536213, 71.774256) -> (130.91255, 57.397918)
  arc A10 (116.536213, 71.774256) -> (105.157697, 72.187869) centre (110.915779, 73.874429) ccw
  line L7 (61.639334, 28.669506) -> (105.157697, 72.187869)
  line L8 (7.753357, 28.669506) -> (61.639334, 28.669506)
  arc A11 (7.753357, 28.669506) -> (0, 20.331211) centre (2.4892, 25.790504) ccw
  circle A12 centre (76.275871, -10.423895) radius 2.032
  circle A13 centre (49.619112, 16.795017) radius 2.032
  circle A14 centre (69.401607, -17.017083) radius 2.032
  circle A15 centre (42.744848, 10.20183) radius 2.032
  circle A16 centre (55.931223, -3.546699) radius 2.032
  line L9 (66.687238, -7.541641) -> (86.982617, 12.753737)
  line L10 (49.804357, 9.34124) -> (66.687238, -7.541641)
  line L11 (70.099736, 29.636619) -> (49.804357, 9.34124)
  line L12 (86.982617, 12.753737) -> (70.099736, 29.636619)
  point P0 (0, -8.338294)
sketch "Sketch19 outline for Extrusion19" plane through (0, 0, 8.338294) normal (0, -1, 0) x (1, 0, 0)
  arc A0 (7.753357, 28.669506) -> (0, 20.331211) centre (2.4892, 25.790504) ccw
  line L0 (61.639334, 28.669506) -> (7.753357, 28.669506)
  line L1 (0, 20.331211) -> (0, 0)
  line L2 (105.157697, 72.187869) -> (61.639334, 28.669506)
  arc A1 (0, 0) -> (7.753357, -8.338294) centre (2.4892, -5.459293) ccw
  arc A2 (116.536213, 71.774256) -> (105.157697, 72.187869) centre (110.915779, 73.874429) ccw
  line L3 (7.753357, -8.338294) -> (50.8, -8.338294)
  line L4 (130.91255, 57.397918) -> (116.536213, 71.774256)
  line L5 (50.8, -8.338294) -> (50.8, -51.384937)
  arc A3 (131.326163, 46.019402) -> (130.91255, 57.397918) centre (133.012723, 51.777485) ccw
  arc A4 (50.8, -51.384937) -> (59.138294, -59.138294) centre (53.679001, -56.649094) ccw
  line L6 (87.8078, 2.501039) -> (131.326163, 46.019402)
  line L7 (59.138294, -59.138294) -> (79.469506, -59.138294)
  line L8 (87.8078, -51.384937) -> (87.8078, 2.501039)
  arc A5 (79.469506, -59.138294) -> (87.8078, -51.384937) centre (84.928799, -56.649094) ccw
  circle A6 centre (53.679001, -56.649094) radius 1.5875
  circle A7 centre (2.4892, -5.459293) radius 1.5875
  circle A8 centre (55.931223, -3.546699) radius 2.032
  circle A9 centre (84.928799, -56.649094) radius 1.5875
  circle A10 centre (69.401607, -17.017083) radius 2.032
  circle A11 centre (76.275871, -10.423895) radius 2.032
  circle A12 centre (2.4892, 25.790504) radius 1.5875
  circle A13 centre (42.744848, 10.20183) radius 2.032
  circle A14 centre (49.619112, 16.795017) radius 2.032
  line L9 (66.687238, -7.541641) -> (49.804357, 9.34124)
  line L10 (86.982617, 12.753737) -> (66.687238, -7.541641)
  line L11 (70.099736, 29.636619) -> (86.982617, 12.753737)
  line L12 (49.804357, 9.34124) -> (70.099736, 29.636619)
  circle A15 centre (133.012723, 51.777485) radius 1.5875
  circle A16 centre (110.915779, 73.874429) radius 1.5875
extrude "Extrusion19" cut sketch "Sketch19 outline for Extrusion19" against normal blind 50.8
sketch "Sketch20" plane through (70.099736, 41.5544, 37.974913) normal (0, 1, 0) x (0.7071068, 0, -0.7071068)
  line L0 (0, 28.702) -> (0, 0) projected
  line L1 (0, 0) -> (23.876, 0) projected
  line L2 (23.876, 0) -> (23.876, 28.702) projected
  line L3 (23.876, 28.702) -> (0, 28.702) projected
  point P0 (-22.71568, 76.420317)
sketch "Sketch20 outline for Extrusion20" plane through (70.099736, 41.5544, 37.974913) normal (0, 1, 0) x (0.7071068, 0, -0.7071068)
  line L0 (0, 28.702) -> (0, 0)
  line L1 (23.876, 28.702) -> (0, 28.702)
  line L2 (23.876, 0) -> (23.876, 28.702)
  line L3 (0, 0) -> (23.876, 0)
extrude "Extrusion20" cut sketch "Sketch20 outline for Extrusion20" against normal blind 38.1
equation "\"d7\" = d6"
properties part number "shockMount"
